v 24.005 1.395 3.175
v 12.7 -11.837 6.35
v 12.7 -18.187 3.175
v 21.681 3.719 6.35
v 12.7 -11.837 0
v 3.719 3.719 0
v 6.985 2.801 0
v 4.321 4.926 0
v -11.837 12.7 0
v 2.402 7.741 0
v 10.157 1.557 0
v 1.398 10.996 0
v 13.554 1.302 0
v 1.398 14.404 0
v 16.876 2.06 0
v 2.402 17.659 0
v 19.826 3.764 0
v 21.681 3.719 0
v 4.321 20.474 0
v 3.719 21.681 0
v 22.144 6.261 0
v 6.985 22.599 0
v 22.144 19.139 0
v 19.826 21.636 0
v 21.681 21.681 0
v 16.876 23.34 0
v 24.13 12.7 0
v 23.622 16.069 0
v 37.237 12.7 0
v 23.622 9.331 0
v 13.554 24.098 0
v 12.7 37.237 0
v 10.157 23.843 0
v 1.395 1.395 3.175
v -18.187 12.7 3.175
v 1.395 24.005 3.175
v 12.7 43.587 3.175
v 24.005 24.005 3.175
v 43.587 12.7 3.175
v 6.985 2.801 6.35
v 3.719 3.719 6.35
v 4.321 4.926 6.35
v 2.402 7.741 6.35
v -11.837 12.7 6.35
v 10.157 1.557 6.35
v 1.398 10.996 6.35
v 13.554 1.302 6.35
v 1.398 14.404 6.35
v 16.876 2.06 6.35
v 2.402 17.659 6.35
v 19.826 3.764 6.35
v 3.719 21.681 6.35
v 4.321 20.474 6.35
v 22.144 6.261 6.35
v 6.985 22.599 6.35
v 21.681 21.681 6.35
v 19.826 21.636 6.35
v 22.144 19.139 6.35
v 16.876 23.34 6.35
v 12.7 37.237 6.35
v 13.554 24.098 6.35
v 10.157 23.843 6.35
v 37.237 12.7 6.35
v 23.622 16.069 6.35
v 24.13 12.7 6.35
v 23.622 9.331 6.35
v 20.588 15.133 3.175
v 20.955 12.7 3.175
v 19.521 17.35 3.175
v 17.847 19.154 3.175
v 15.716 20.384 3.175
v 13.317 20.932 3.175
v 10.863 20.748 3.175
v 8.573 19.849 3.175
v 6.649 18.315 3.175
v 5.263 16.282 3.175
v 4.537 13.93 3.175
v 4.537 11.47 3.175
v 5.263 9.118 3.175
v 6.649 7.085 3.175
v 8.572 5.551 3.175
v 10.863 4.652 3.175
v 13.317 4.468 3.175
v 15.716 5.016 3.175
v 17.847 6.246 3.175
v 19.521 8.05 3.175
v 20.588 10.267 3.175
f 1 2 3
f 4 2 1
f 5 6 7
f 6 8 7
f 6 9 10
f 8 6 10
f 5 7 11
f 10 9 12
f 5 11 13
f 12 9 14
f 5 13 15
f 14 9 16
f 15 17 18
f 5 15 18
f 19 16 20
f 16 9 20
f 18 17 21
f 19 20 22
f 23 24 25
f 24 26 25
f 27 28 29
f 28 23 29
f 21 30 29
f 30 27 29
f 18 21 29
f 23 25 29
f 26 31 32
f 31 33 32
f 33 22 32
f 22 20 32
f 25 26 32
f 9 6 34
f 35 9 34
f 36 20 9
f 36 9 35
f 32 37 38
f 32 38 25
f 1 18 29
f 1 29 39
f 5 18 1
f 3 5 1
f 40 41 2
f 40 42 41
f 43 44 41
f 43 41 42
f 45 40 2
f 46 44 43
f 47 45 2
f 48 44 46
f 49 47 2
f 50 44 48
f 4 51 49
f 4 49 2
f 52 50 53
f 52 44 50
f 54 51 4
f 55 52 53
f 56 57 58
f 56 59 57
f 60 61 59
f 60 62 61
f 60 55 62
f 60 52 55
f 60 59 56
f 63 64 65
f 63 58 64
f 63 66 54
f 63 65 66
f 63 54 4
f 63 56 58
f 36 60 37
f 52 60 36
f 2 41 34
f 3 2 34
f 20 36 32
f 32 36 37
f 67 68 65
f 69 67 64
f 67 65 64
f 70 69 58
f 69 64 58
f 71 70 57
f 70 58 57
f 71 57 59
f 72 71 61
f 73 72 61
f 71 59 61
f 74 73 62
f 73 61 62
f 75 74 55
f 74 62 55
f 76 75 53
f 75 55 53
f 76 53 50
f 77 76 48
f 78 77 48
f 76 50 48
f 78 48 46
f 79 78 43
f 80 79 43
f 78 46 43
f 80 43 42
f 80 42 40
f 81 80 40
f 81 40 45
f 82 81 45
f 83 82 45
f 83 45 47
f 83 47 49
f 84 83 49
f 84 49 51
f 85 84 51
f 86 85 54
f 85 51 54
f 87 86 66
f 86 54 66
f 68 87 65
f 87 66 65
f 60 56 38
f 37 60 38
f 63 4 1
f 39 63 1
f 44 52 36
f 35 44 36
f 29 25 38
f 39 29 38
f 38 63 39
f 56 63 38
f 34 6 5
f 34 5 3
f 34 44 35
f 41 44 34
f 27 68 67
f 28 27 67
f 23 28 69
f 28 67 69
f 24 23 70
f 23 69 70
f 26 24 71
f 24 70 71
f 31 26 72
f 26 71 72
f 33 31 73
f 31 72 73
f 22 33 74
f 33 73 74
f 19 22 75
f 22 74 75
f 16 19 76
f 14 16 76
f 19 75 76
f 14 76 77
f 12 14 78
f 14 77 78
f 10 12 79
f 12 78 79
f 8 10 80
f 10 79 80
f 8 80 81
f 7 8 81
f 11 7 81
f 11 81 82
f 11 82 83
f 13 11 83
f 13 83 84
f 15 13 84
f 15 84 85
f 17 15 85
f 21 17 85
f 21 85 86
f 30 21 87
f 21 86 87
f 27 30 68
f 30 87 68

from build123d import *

# Parameters (mm, degrees)
F0_W         = 25.4
F0_H         = 25.4
F0_R         = 6.35
F1_DEPTH     = 6.35
F2_SIZE      = 5.08
F3_T4_DEPTH  = 51.5282991577
F3_T9_DEPTH  = 51.5282991577
F3_T14_DEPTH = 51.5282991577
F3_T19_DEPTH = 51.5282991577
F3_T24_DEPTH = 51.5282991577
F3_T29_DEPTH = 51.5282991577
F3_T34_DEPTH = 51.5282991577
F3_T39_DEPTH = 51.5282991577
F3_T47_DEPTH = 51.5282991577
F3_T51_DEPTH = 51.5282991577
F3_T58_DEPTH = 51.5282991577
F3_T62_DEPTH = 51.5282991577
F3_T69_DEPTH = 51.5282991577
F3_T73_DEPTH = 51.5282991577
F3_T80_DEPTH = 51.5282991577
F3_T84_DEPTH = 51.5282991577


# Not quite as in the source:
# - a fillet or chamfer that OpenCascade refuses, or shapes differently, is made with other operations: its cross-section is extruded or revolved along the edge and cut away or added


with BuildPart() as f1:
    # F0 (on Top) → F1 (new body)
    with BuildSketch(Plane.XY):
        Polygon((12.7, 47.3970452561), (0, 25.4), (25.4, 25.4), align=None)
        with Locations((12.7, 12.7)):
            Rectangle(F0_W, F0_H)
        with Locations((12.7, 12.7)):
            Circle(F0_R, mode=Mode.SUBTRACT)
        Polygon((25.4, 25.4), (25.4, 0), (47.3970452561, 12.7), align=None)
        Polygon((25.4, 0), (0, 0), (12.7, -21.9970452561), align=None)
        Polygon((-21.9970452561, 12.7), (0, 0), (0, 25.4), align=None)
    extrude(amount=F1_DEPTH)

    # F2
    f2_edges = [f1.edges().sort_by_distance(p)[0] for p in [
        (6.35, 36.398523, 6.35),
        (-10.998523, 19.05, 6.35),
        (-10.998523, 6.35, 6.35),
        (6.35, -10.998523, 6.35),
        (19.05, -10.998523, 6.35),
        (36.398523, 6.35, 6.35),
        (36.398523, 19.05, 6.35),
        (19.05, 36.398523, 6.35),
        (6.35, 12.7, 6.35),
    ]]
    chamfer(f2_edges, length=F2_SIZE)

    # F3: chamfer of 5.08 on 9 edges, made by hand


with BuildPart() as f3_tool2:
    # F3_s3 → F3_t4 (new body)
    with BuildSketch(Plane(origin=(41.3624080422, -23.8805974175, 0), x_dir=(0, 0, 1), z_dir=(-0.8660254038, 0.5, 0))):
        Polygon((0, 29.6170452561), (5.08, 34.6970452561), (0, 34.6970452561), align=None)
    extrude(amount=F3_T4_DEPTH)

    split(bisect_by=Plane(origin=(30.0485226281, 17.3485226281, 0), x_dir=(0, 0, 1), z_dir=(0.8660254038, 0.5, 0)), keep=Keep.TOP)


with BuildPart() as f1_1:
    add(f1.part)

    # F3_t1: cut F3_tool2
    add(f3_tool2.part, mode=Mode.SUBTRACT)


with BuildPart() as f3_tool7:
    # F3_s8 → F3_t9 (new body)
    with BuildSketch(Plane(origin=(30.2305974175, 52.3609306703, 0), x_dir=(0, 0, 1), z_dir=(-0.5, -0.8660254038, 0))):
        Polygon((5.08, 12.7), (0, 7.62), (0, 12.7), align=None)
    extrude(amount=F3_T9_DEPTH)

    split(bisect_by=Plane(origin=(-10.9985226281, 19.05, 0), x_dir=(0, 0, 1), z_dir=(-0.5, 0.8660254038, 0)), keep=Keep.TOP)


with BuildPart() as f1_2:
    add(f1_1.part)

    # F3_t6: cut F3_tool7
    add(f3_tool7.part, mode=Mode.SUBTRACT)


with BuildPart() as f3_tool12:
    # F3_s13 → F3_t14 (new body)
    with BuildSketch(Plane(origin=(22.3124080422, 12.8820747894, 0), x_dir=(0, 0, 1), z_dir=(-0.8660254038, -0.5, 0))):
        Polygon((0, 16.9170452561), (5.08, 21.9970452561), (0, 21.9970452561), align=None)
    extrude(amount=F3_T14_DEPTH)

    split(bisect_by=Plane(origin=(-10.9985226281, 6.35, 0), x_dir=(0, 0, 1), z_dir=(-0.8660254038, 0.5, 0)), keep=Keep.TOP)


with BuildPart() as f1_3:
    add(f1_2.part)

    # F3_t11: cut F3_tool12
    add(f3_tool12.part, mode=Mode.SUBTRACT)


with BuildPart() as f3_tool17:
    # F3_s18 → F3_t19 (new body)
    with BuildSketch(Plane(origin=(-33.3109306703, 19.2320747894, 0), x_dir=(0, 0, 1), z_dir=(0.8660254038, -0.5, 0))):
        Polygon((0, -5.08), (5.08, 0), (0, 0), align=None)
    extrude(amount=F3_T19_DEPTH)

    split(bisect_by=Plane(origin=(0, 0, 0), x_dir=(0, 0, 1), z_dir=(-0.8660254038, -0.5, 0)), keep=Keep.TOP)


with BuildPart() as f1_4:
    add(f1_3.part)

    # F3_t16: cut F3_tool17
    add(f3_tool17.part, mode=Mode.SUBTRACT)


with BuildPart() as f3_tool22:
    # F3_s23 → F3_t24 (new body)
    with BuildSketch(Plane(origin=(-6.5320747894, 11.3138854141, 0), x_dir=(0, 0, 1), z_dir=(0.5, -0.8660254038, 0))):
        Polygon((0, -5.08), (5.08, 0), (0, 0), align=None)
    extrude(amount=F3_T24_DEPTH)

    split(bisect_by=Plane(origin=(0, 0, 0), x_dir=(0, 0, 1), z_dir=(-0.5, -0.8660254038, 0)), keep=Keep.TOP)


with BuildPart() as f1_5:
    add(f1_4.part)

    # F3_t21: cut F3_tool22
    add(f3_tool22.part, mode=Mode.SUBTRACT)


with BuildPart() as f3_tool27:
    # F3_s28 → F3_t29 (new body)
    with BuildSketch(Plane(origin=(-12.8820747894, -22.3124080422, 0), x_dir=(0, 0, 1), z_dir=(0.5, 0.8660254038, 0))):
        Polygon((0, 16.9170452561), (5.08, 21.9970452561), (0, 21.9970452561), align=None)
    extrude(amount=F3_T29_DEPTH)

    split(bisect_by=Plane(origin=(6.35, -10.9985226281, 0), x_dir=(0, 0, 1), z_dir=(0.5, -0.8660254038, 0)), keep=Keep.TOP)


with BuildPart() as f1_6:
    add(f1_5.part)

    # F3_t26: cut F3_tool27
    add(f3_tool27.part, mode=Mode.SUBTRACT)


with BuildPart() as f3_tool32:
    # F3_s33 → F3_t34 (new body)
    with BuildSketch(Plane(origin=(7.7361145859, 4.4664478386, 0), x_dir=(0, 0, 1), z_dir=(0.8660254038, 0.5, 0))):
        Polygon((0, 7.62), (5.08, 12.7), (0, 12.7), align=None)
    extrude(amount=F3_T34_DEPTH)

    split(bisect_by=Plane(origin=(19.05, -10.9985226281, 0), x_dir=(0, 0, 1), z_dir=(0.8660254038, -0.5, 0)), keep=Keep.TOP)


with BuildPart() as f1_7:
    add(f1_6.part)

    # F3_t31: cut F3_tool32
    add(f3_tool32.part, mode=Mode.SUBTRACT)


with BuildPart() as f3_tool37:
    # F3_s38 → F3_t39 (new body)
    with BuildSketch(Plane(origin=(1.8835521614, -3.2624080422, 0), x_dir=(0, 0, 1), z_dir=(-0.5, 0.8660254038, 0))):
        Polygon((5.08, 34.6970452561), (0, 29.6170452561), (0, 34.6970452561), align=None)
    extrude(amount=F3_T39_DEPTH)

    split(bisect_by=Plane(origin=(17.3485226281, 30.0485226281, 0), x_dir=(0, 0, 1), z_dir=(0.5, 0.8660254038, 0)), keep=Keep.TOP)


with BuildPart() as f1_8:
    add(f1_7.part)

    # F3_t36: cut F3_tool37
    add(f3_tool37.part, mode=Mode.SUBTRACT)

    # F3_s41 → F3_t42 (revolve, cut)
    with BuildSketch(Plane.XZ.offset(-12.7)):
        Polygon((24.13, 0), (19.05, 5.08), (19.05, 0), align=None)
    revolve(axis=Axis((12.7, 12.7, 0), (0, 0, 1)), mode=Mode.SUBTRACT)


with BuildPart() as f3_tool45:
    # F3_s46 → F3_t47 (new body)
    with BuildSketch(Plane(origin=(1.8835521614, -3.2624080422, 0), x_dir=(0, 0, 1), z_dir=(-0.5, 0.8660254038, 0))):
        Polygon((5.08, 34.6970452561), (0, 29.6170452561), (0, 34.6970452561), align=None)
    extrude(amount=F3_T47_DEPTH)

    split(bisect_by=Plane(origin=(17.3485226281, 30.0485226281, 0), x_dir=(0, 0, 1), z_dir=(-0.5, -0.8660254038, 0)), keep=Keep.TOP)


with BuildPart() as f3_tool49:
    # F3_s50 → F3_t51 (new body)
    with BuildSketch(Plane(origin=(41.3624080422, -23.8805974175, 0), x_dir=(0, 0, 1), z_dir=(-0.8660254038, 0.5, 0))):
        Polygon((0, 29.6170452561), (5.08, 34.6970452561), (0, 34.6970452561), align=None)
    extrude(amount=F3_T51_DEPTH)

    split(bisect_by=Plane(origin=(30.0485226281, 17.3485226281, 0), x_dir=(0, 0, 1), z_dir=(-0.8660254038, -0.5, 0)), keep=Keep.TOP)


with BuildPart() as f3_tool45_1:
    add(f3_tool45.part)

    # F3_t53: intersect F3_tool49
    add(f3_tool49.part, mode=Mode.INTERSECT)


with BuildPart() as f1_9:
    add(f1_8.part)

    # F3_t43: cut F3_tool45
    add(f3_tool45_1.part, mode=Mode.SUBTRACT)


with BuildPart() as f3_tool56:
    # F3_s57 → F3_t58 (new body)
    with BuildSketch(Plane(origin=(30.2305974175, 52.3609306703, 0), x_dir=(0, 0, 1), z_dir=(-0.5, -0.8660254038, 0))):
        Polygon((5.08, 12.7), (0, 7.62), (0, 12.7), align=None)
    extrude(amount=F3_T58_DEPTH)

    split(bisect_by=Plane(origin=(-10.9985226281, 19.05, 0), x_dir=(0, 0, 1), z_dir=(0.5, -0.8660254038, 0)), keep=Keep.TOP)


with BuildPart() as f3_tool60:
    # F3_s61 → F3_t62 (new body)
    with BuildSketch(Plane(origin=(22.3124080422, 12.8820747894, 0), x_dir=(0, 0, 1), z_dir=(-0.8660254038, -0.5, 0))):
        Polygon((0, 16.9170452561), (5.08, 21.9970452561), (0, 21.9970452561), align=None)
    extrude(amount=F3_T62_DEPTH)

    split(bisect_by=Plane(origin=(-10.9985226281, 6.35, 0), x_dir=(0, 0, 1), z_dir=(0.8660254038, -0.5, 0)), keep=Keep.TOP)


with BuildPart() as f3_tool56_1:
    add(f3_tool56.part)

    # F3_t64: intersect F3_tool60
    add(f3_tool60.part, mode=Mode.INTERSECT)


with BuildPart() as f1_10:
    add(f1_9.part)

    # F3_t54: cut F3_tool56
    add(f3_tool56_1.part, mode=Mode.SUBTRACT)


with BuildPart() as f3_tool67:
    # F3_s68 → F3_t69 (new body)
    with BuildSketch(Plane(origin=(-33.3109306703, 19.2320747894, 0), x_dir=(0, 0, 1), z_dir=(0.8660254038, -0.5, 0))):
        Polygon((0, -5.08), (5.08, 0), (0, 0), align=None)
    extrude(amount=F3_T69_DEPTH)

    split(bisect_by=Plane(origin=(0, 0, 0), x_dir=(0, 0, 1), z_dir=(0.8660254038, 0.5, 0)), keep=Keep.TOP)


with BuildPart() as f3_tool71:
    # F3_s72 → F3_t73 (new body)
    with BuildSketch(Plane(origin=(-6.5320747894, 11.3138854141, 0), x_dir=(0, 0, 1), z_dir=(0.5, -0.8660254038, 0))):
        Polygon((0, -5.08), (5.08, 0), (0, 0), align=None)
    extrude(amount=F3_T73_DEPTH)

    split(bisect_by=Plane(origin=(0, 0, 0), x_dir=(0, 0, 1), z_dir=(0.5, 0.8660254038, 0)), keep=Keep.TOP)


with BuildPart() as f3_tool67_1:
    add(f3_tool67.part)

    # F3_t75: intersect F3_tool71
    add(f3_tool71.part, mode=Mode.INTERSECT)


with BuildPart() as f1_11:
    add(f1_10.part)

    # F3_t65: cut F3_tool67
    add(f3_tool67_1.part, mode=Mode.SUBTRACT)


with BuildPart() as f3_tool78:
    # F3_s79 → F3_t80 (new body)
    with BuildSketch(Plane(origin=(-12.8820747894, -22.3124080422, 0), x_dir=(0, 0, 1), z_dir=(0.5, 0.8660254038, 0))):
        Polygon((0, 16.9170452561), (5.08, 21.9970452561), (0, 21.9970452561), align=None)
    extrude(amount=F3_T80_DEPTH)

    split(bisect_by=Plane(origin=(6.35, -10.9985226281, 0), x_dir=(0, 0, 1), z_dir=(-0.5, 0.8660254038, 0)), keep=Keep.TOP)


with BuildPart() as f3_tool82:
    # F3_s83 → F3_t84 (new body)
    with BuildSketch(Plane(origin=(7.7361145859, 4.4664478386, 0), x_dir=(0, 0, 1), z_dir=(0.8660254038, 0.5, 0))):
        Polygon((0, 7.62), (5.08, 12.7), (0, 12.7), align=None)
    extrude(amount=F3_T84_DEPTH)

    split(bisect_by=Plane(origin=(19.05, -10.9985226281, 0), x_dir=(0, 0, 1), z_dir=(-0.8660254038, 0.5, 0)), keep=Keep.TOP)


with BuildPart() as f3_tool78_1:
    add(f3_tool78.part)

    # F3_t86: intersect F3_tool82
    add(f3_tool82.part, mode=Mode.INTERSECT)


with BuildPart() as f1_12:
    add(f1_11.part)

    # F3_t76: cut F3_tool78
    add(f3_tool78_1.part, mode=Mode.SUBTRACT)


solid = f1_12.part
